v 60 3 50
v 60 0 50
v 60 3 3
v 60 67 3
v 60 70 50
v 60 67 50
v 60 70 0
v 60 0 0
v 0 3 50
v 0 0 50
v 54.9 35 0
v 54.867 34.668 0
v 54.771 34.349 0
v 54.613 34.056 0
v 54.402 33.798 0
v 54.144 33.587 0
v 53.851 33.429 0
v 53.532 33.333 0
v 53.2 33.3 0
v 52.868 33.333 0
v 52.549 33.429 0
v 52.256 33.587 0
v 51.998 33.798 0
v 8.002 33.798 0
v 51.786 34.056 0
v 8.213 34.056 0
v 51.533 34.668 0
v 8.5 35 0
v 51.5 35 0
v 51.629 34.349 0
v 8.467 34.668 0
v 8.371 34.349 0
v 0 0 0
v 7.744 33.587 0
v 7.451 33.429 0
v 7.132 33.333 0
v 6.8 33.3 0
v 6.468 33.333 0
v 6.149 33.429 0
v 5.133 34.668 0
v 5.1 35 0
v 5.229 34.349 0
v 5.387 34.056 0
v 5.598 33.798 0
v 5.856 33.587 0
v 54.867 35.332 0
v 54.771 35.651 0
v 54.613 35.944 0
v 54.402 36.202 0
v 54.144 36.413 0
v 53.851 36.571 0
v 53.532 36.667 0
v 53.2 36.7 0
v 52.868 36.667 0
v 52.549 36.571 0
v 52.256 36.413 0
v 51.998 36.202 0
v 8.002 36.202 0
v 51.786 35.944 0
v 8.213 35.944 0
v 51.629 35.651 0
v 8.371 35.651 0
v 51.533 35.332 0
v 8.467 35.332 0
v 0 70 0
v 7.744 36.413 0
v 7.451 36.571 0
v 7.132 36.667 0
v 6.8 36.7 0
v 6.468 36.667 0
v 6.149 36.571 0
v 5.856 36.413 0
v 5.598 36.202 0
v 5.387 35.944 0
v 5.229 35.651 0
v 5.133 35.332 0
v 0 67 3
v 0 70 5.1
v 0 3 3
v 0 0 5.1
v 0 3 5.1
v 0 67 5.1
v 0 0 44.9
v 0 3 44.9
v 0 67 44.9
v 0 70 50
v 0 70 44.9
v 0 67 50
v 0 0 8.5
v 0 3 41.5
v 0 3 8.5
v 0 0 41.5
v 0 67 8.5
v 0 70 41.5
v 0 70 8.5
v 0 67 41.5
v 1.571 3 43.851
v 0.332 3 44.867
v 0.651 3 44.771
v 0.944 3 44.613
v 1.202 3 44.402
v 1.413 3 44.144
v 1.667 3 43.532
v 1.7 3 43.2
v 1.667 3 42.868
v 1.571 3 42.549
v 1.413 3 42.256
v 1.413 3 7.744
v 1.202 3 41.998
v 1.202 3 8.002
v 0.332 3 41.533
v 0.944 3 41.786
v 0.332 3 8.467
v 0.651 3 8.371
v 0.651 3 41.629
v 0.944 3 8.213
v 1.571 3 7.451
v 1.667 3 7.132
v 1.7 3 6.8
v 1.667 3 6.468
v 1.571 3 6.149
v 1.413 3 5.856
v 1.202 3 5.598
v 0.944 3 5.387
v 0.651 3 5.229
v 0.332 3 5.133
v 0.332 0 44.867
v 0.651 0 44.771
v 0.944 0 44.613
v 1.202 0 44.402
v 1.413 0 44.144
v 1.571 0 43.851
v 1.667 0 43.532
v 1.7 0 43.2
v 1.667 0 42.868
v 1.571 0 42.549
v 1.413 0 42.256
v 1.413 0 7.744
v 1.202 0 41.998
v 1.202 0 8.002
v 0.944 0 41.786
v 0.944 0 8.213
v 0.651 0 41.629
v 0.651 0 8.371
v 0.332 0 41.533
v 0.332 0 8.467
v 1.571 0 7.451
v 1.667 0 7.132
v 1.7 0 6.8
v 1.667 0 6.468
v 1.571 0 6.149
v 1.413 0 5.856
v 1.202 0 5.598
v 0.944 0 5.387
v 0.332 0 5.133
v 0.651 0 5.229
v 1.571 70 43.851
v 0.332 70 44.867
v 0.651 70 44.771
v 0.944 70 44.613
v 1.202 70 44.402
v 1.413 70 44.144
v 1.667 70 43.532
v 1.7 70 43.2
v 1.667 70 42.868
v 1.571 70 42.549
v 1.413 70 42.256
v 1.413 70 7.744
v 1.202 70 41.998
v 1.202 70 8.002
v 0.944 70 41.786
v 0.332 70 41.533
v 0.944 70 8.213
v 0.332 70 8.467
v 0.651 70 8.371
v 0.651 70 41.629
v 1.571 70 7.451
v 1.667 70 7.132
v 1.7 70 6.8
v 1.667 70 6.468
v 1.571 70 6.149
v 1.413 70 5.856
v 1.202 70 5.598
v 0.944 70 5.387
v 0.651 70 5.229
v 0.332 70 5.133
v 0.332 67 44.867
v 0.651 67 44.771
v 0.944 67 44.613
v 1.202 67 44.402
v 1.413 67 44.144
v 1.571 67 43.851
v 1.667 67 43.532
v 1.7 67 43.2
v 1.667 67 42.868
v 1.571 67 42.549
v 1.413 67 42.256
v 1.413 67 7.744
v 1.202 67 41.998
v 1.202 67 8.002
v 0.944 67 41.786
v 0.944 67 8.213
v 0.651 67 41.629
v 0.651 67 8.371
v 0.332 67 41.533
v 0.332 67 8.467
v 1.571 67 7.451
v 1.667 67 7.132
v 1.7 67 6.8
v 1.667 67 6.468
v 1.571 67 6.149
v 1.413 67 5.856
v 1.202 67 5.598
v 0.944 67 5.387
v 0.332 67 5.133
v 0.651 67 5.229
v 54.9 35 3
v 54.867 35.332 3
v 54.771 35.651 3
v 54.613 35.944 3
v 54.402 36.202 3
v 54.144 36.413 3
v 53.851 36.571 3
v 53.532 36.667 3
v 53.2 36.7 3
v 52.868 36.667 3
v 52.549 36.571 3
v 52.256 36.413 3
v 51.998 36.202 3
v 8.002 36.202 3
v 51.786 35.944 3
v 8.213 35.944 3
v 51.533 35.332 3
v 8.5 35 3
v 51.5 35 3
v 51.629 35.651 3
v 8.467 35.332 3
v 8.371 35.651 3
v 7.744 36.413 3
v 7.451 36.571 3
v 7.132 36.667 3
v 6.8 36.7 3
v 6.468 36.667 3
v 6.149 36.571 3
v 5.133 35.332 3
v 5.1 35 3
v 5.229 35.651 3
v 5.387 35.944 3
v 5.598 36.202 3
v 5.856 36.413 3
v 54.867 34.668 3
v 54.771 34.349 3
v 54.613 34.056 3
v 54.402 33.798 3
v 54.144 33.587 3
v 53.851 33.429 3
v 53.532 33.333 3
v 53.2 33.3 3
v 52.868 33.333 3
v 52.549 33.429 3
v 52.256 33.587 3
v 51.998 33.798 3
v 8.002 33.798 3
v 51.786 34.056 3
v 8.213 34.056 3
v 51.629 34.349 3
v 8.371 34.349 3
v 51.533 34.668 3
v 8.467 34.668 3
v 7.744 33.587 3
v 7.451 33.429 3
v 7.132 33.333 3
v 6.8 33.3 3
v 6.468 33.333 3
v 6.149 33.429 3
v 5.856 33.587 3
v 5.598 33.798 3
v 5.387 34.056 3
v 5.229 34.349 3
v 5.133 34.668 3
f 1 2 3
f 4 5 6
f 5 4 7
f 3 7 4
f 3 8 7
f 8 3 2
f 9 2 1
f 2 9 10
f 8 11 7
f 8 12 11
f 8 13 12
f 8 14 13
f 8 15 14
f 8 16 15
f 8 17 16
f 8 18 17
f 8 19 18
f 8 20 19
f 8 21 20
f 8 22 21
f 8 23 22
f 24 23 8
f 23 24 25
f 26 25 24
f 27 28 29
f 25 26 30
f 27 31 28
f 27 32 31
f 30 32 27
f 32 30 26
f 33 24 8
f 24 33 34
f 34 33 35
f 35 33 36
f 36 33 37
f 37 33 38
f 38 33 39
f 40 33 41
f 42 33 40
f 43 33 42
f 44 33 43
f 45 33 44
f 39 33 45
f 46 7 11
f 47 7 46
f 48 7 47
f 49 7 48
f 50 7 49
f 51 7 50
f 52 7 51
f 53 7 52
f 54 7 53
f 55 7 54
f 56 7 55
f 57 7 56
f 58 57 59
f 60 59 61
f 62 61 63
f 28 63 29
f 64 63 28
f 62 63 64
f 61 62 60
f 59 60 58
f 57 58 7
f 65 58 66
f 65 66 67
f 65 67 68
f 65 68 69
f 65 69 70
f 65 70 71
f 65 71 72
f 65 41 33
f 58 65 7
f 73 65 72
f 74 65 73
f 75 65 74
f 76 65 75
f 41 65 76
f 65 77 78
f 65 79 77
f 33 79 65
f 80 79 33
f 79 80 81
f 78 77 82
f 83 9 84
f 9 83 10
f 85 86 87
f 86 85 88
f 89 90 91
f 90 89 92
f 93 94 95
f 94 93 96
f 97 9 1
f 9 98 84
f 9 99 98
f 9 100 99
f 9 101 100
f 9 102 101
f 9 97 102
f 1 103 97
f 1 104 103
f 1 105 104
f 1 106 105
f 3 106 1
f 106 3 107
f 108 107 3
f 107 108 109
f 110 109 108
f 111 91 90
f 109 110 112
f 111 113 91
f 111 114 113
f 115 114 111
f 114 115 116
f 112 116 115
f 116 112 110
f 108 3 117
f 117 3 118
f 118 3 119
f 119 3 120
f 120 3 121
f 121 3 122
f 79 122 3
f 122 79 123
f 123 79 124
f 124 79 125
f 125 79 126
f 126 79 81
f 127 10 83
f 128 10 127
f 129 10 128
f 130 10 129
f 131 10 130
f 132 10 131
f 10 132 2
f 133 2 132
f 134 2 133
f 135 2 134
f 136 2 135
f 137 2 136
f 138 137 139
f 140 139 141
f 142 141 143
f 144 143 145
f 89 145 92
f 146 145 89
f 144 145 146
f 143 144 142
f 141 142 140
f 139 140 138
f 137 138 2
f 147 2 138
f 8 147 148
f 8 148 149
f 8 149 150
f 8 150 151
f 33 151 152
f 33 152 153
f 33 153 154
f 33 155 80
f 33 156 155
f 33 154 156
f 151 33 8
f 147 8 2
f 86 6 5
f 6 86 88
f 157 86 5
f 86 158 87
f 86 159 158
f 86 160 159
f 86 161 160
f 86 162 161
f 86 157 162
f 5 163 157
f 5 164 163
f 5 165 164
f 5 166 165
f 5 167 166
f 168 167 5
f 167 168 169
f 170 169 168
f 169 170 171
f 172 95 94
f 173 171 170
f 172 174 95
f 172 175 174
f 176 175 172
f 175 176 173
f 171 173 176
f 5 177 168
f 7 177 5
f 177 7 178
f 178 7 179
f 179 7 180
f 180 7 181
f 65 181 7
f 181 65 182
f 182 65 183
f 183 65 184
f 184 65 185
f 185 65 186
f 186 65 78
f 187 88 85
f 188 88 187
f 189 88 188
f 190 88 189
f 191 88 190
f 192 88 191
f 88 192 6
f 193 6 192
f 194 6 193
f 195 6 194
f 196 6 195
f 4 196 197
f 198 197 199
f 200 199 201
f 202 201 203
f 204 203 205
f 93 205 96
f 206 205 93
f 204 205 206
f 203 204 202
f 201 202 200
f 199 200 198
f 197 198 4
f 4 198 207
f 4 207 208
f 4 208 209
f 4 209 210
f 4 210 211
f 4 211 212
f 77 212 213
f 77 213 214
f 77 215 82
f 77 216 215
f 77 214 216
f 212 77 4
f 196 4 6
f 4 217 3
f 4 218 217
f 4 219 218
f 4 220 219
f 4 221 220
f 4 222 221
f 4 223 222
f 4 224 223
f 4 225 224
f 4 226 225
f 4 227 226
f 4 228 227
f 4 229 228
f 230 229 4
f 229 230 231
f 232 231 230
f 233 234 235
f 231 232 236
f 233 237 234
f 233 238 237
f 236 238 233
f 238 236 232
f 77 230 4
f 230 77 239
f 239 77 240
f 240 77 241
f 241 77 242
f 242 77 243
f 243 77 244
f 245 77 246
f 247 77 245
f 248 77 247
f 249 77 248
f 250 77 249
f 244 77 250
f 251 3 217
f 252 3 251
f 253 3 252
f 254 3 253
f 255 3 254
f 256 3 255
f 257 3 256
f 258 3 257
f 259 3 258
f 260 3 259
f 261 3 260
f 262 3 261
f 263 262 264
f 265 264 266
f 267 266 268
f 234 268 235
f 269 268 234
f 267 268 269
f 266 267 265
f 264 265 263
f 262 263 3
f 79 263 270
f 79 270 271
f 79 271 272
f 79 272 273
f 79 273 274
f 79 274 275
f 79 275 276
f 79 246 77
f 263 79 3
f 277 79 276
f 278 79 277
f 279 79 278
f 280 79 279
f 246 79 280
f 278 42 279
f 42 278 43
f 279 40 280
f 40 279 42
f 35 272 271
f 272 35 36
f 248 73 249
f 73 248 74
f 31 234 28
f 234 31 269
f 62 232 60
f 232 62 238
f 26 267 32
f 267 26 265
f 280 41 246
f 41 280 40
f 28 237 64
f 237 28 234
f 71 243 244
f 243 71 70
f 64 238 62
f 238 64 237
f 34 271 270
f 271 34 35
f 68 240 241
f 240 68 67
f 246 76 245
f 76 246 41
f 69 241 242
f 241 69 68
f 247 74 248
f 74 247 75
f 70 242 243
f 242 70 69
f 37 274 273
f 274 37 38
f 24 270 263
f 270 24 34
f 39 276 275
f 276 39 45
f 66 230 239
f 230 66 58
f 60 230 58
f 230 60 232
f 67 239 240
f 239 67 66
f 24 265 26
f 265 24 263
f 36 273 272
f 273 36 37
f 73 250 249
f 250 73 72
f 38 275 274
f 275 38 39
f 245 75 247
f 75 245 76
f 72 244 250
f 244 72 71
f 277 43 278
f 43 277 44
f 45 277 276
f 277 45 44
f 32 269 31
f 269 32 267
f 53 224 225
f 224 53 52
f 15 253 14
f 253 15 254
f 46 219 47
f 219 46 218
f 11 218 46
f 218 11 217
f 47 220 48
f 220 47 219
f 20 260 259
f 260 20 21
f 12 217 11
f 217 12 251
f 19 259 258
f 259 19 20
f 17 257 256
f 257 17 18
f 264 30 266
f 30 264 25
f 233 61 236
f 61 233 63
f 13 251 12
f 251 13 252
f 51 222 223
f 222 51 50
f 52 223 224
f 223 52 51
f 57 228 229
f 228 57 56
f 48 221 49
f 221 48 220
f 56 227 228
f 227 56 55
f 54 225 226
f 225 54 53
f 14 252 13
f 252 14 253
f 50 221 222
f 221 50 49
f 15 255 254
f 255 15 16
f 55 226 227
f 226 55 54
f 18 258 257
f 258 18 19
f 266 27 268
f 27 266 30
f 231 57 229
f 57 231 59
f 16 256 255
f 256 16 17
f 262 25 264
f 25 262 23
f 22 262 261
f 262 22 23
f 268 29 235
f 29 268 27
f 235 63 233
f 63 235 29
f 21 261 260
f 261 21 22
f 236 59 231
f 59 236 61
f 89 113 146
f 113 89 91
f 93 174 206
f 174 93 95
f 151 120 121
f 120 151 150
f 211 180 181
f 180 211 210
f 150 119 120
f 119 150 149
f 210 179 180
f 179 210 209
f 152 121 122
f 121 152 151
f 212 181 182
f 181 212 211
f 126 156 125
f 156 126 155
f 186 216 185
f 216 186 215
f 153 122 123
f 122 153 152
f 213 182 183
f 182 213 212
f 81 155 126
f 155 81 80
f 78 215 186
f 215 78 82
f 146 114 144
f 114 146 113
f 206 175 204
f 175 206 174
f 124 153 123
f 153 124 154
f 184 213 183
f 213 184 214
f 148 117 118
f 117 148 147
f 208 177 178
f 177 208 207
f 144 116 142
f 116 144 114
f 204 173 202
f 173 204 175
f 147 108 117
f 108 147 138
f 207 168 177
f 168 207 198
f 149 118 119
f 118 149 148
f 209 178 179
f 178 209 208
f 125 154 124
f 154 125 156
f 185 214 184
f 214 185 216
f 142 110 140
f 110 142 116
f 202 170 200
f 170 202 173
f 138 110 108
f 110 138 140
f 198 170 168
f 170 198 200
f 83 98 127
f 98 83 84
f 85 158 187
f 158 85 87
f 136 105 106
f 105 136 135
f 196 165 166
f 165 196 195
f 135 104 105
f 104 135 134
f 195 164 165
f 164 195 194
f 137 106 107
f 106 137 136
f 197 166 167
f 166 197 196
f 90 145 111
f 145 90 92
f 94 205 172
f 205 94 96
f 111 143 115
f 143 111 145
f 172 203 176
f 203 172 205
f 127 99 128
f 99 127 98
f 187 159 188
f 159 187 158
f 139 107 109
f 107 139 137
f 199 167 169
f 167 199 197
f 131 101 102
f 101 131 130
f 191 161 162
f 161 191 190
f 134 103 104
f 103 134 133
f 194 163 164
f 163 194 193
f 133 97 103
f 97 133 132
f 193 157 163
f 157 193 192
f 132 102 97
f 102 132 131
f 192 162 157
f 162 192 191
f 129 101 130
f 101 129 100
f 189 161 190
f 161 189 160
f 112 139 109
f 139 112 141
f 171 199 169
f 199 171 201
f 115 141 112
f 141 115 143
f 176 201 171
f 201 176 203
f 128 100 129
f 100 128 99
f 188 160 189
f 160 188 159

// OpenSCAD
$fn = 32;

// ----------------------------------------------------------------------
// U-bracket: 60 x 70 x 50 mm
// ----------------------------------------------------------------------

// --- parameters (mm) ---
length = 60;              // outer length, X
width = 70;               // outer width, Y
height = 50;              // upright height, Z
thick = 3;                // wall thickness
hole_d = 3.4;             // clearance for M3

module hole_z(px, py) {
  translate([px, py, -0.5]) cylinder(h = thick + 1, d = hole_d);
}
module hole_y_pz(pz) {
  /* through both uprights along Y */
  translate([0, -0.5, pz]) rotate([-90, 0, 0]) cylinder(h = width + 1, d = hole_d);
}

module base() {
  cube([length, width, thick]);
}

module uprights() {
  cube([length, thick, height]);
  translate([0, width - thick, 0]) cube([length, thick, height]);
}

difference() {
  union() {
    base();
    uprights();
  }
  hole_z(6.8, 35);
  hole_z(53.2, 35);
  hole_y_pz(6.8);
  hole_y_pz(43.2);
}
